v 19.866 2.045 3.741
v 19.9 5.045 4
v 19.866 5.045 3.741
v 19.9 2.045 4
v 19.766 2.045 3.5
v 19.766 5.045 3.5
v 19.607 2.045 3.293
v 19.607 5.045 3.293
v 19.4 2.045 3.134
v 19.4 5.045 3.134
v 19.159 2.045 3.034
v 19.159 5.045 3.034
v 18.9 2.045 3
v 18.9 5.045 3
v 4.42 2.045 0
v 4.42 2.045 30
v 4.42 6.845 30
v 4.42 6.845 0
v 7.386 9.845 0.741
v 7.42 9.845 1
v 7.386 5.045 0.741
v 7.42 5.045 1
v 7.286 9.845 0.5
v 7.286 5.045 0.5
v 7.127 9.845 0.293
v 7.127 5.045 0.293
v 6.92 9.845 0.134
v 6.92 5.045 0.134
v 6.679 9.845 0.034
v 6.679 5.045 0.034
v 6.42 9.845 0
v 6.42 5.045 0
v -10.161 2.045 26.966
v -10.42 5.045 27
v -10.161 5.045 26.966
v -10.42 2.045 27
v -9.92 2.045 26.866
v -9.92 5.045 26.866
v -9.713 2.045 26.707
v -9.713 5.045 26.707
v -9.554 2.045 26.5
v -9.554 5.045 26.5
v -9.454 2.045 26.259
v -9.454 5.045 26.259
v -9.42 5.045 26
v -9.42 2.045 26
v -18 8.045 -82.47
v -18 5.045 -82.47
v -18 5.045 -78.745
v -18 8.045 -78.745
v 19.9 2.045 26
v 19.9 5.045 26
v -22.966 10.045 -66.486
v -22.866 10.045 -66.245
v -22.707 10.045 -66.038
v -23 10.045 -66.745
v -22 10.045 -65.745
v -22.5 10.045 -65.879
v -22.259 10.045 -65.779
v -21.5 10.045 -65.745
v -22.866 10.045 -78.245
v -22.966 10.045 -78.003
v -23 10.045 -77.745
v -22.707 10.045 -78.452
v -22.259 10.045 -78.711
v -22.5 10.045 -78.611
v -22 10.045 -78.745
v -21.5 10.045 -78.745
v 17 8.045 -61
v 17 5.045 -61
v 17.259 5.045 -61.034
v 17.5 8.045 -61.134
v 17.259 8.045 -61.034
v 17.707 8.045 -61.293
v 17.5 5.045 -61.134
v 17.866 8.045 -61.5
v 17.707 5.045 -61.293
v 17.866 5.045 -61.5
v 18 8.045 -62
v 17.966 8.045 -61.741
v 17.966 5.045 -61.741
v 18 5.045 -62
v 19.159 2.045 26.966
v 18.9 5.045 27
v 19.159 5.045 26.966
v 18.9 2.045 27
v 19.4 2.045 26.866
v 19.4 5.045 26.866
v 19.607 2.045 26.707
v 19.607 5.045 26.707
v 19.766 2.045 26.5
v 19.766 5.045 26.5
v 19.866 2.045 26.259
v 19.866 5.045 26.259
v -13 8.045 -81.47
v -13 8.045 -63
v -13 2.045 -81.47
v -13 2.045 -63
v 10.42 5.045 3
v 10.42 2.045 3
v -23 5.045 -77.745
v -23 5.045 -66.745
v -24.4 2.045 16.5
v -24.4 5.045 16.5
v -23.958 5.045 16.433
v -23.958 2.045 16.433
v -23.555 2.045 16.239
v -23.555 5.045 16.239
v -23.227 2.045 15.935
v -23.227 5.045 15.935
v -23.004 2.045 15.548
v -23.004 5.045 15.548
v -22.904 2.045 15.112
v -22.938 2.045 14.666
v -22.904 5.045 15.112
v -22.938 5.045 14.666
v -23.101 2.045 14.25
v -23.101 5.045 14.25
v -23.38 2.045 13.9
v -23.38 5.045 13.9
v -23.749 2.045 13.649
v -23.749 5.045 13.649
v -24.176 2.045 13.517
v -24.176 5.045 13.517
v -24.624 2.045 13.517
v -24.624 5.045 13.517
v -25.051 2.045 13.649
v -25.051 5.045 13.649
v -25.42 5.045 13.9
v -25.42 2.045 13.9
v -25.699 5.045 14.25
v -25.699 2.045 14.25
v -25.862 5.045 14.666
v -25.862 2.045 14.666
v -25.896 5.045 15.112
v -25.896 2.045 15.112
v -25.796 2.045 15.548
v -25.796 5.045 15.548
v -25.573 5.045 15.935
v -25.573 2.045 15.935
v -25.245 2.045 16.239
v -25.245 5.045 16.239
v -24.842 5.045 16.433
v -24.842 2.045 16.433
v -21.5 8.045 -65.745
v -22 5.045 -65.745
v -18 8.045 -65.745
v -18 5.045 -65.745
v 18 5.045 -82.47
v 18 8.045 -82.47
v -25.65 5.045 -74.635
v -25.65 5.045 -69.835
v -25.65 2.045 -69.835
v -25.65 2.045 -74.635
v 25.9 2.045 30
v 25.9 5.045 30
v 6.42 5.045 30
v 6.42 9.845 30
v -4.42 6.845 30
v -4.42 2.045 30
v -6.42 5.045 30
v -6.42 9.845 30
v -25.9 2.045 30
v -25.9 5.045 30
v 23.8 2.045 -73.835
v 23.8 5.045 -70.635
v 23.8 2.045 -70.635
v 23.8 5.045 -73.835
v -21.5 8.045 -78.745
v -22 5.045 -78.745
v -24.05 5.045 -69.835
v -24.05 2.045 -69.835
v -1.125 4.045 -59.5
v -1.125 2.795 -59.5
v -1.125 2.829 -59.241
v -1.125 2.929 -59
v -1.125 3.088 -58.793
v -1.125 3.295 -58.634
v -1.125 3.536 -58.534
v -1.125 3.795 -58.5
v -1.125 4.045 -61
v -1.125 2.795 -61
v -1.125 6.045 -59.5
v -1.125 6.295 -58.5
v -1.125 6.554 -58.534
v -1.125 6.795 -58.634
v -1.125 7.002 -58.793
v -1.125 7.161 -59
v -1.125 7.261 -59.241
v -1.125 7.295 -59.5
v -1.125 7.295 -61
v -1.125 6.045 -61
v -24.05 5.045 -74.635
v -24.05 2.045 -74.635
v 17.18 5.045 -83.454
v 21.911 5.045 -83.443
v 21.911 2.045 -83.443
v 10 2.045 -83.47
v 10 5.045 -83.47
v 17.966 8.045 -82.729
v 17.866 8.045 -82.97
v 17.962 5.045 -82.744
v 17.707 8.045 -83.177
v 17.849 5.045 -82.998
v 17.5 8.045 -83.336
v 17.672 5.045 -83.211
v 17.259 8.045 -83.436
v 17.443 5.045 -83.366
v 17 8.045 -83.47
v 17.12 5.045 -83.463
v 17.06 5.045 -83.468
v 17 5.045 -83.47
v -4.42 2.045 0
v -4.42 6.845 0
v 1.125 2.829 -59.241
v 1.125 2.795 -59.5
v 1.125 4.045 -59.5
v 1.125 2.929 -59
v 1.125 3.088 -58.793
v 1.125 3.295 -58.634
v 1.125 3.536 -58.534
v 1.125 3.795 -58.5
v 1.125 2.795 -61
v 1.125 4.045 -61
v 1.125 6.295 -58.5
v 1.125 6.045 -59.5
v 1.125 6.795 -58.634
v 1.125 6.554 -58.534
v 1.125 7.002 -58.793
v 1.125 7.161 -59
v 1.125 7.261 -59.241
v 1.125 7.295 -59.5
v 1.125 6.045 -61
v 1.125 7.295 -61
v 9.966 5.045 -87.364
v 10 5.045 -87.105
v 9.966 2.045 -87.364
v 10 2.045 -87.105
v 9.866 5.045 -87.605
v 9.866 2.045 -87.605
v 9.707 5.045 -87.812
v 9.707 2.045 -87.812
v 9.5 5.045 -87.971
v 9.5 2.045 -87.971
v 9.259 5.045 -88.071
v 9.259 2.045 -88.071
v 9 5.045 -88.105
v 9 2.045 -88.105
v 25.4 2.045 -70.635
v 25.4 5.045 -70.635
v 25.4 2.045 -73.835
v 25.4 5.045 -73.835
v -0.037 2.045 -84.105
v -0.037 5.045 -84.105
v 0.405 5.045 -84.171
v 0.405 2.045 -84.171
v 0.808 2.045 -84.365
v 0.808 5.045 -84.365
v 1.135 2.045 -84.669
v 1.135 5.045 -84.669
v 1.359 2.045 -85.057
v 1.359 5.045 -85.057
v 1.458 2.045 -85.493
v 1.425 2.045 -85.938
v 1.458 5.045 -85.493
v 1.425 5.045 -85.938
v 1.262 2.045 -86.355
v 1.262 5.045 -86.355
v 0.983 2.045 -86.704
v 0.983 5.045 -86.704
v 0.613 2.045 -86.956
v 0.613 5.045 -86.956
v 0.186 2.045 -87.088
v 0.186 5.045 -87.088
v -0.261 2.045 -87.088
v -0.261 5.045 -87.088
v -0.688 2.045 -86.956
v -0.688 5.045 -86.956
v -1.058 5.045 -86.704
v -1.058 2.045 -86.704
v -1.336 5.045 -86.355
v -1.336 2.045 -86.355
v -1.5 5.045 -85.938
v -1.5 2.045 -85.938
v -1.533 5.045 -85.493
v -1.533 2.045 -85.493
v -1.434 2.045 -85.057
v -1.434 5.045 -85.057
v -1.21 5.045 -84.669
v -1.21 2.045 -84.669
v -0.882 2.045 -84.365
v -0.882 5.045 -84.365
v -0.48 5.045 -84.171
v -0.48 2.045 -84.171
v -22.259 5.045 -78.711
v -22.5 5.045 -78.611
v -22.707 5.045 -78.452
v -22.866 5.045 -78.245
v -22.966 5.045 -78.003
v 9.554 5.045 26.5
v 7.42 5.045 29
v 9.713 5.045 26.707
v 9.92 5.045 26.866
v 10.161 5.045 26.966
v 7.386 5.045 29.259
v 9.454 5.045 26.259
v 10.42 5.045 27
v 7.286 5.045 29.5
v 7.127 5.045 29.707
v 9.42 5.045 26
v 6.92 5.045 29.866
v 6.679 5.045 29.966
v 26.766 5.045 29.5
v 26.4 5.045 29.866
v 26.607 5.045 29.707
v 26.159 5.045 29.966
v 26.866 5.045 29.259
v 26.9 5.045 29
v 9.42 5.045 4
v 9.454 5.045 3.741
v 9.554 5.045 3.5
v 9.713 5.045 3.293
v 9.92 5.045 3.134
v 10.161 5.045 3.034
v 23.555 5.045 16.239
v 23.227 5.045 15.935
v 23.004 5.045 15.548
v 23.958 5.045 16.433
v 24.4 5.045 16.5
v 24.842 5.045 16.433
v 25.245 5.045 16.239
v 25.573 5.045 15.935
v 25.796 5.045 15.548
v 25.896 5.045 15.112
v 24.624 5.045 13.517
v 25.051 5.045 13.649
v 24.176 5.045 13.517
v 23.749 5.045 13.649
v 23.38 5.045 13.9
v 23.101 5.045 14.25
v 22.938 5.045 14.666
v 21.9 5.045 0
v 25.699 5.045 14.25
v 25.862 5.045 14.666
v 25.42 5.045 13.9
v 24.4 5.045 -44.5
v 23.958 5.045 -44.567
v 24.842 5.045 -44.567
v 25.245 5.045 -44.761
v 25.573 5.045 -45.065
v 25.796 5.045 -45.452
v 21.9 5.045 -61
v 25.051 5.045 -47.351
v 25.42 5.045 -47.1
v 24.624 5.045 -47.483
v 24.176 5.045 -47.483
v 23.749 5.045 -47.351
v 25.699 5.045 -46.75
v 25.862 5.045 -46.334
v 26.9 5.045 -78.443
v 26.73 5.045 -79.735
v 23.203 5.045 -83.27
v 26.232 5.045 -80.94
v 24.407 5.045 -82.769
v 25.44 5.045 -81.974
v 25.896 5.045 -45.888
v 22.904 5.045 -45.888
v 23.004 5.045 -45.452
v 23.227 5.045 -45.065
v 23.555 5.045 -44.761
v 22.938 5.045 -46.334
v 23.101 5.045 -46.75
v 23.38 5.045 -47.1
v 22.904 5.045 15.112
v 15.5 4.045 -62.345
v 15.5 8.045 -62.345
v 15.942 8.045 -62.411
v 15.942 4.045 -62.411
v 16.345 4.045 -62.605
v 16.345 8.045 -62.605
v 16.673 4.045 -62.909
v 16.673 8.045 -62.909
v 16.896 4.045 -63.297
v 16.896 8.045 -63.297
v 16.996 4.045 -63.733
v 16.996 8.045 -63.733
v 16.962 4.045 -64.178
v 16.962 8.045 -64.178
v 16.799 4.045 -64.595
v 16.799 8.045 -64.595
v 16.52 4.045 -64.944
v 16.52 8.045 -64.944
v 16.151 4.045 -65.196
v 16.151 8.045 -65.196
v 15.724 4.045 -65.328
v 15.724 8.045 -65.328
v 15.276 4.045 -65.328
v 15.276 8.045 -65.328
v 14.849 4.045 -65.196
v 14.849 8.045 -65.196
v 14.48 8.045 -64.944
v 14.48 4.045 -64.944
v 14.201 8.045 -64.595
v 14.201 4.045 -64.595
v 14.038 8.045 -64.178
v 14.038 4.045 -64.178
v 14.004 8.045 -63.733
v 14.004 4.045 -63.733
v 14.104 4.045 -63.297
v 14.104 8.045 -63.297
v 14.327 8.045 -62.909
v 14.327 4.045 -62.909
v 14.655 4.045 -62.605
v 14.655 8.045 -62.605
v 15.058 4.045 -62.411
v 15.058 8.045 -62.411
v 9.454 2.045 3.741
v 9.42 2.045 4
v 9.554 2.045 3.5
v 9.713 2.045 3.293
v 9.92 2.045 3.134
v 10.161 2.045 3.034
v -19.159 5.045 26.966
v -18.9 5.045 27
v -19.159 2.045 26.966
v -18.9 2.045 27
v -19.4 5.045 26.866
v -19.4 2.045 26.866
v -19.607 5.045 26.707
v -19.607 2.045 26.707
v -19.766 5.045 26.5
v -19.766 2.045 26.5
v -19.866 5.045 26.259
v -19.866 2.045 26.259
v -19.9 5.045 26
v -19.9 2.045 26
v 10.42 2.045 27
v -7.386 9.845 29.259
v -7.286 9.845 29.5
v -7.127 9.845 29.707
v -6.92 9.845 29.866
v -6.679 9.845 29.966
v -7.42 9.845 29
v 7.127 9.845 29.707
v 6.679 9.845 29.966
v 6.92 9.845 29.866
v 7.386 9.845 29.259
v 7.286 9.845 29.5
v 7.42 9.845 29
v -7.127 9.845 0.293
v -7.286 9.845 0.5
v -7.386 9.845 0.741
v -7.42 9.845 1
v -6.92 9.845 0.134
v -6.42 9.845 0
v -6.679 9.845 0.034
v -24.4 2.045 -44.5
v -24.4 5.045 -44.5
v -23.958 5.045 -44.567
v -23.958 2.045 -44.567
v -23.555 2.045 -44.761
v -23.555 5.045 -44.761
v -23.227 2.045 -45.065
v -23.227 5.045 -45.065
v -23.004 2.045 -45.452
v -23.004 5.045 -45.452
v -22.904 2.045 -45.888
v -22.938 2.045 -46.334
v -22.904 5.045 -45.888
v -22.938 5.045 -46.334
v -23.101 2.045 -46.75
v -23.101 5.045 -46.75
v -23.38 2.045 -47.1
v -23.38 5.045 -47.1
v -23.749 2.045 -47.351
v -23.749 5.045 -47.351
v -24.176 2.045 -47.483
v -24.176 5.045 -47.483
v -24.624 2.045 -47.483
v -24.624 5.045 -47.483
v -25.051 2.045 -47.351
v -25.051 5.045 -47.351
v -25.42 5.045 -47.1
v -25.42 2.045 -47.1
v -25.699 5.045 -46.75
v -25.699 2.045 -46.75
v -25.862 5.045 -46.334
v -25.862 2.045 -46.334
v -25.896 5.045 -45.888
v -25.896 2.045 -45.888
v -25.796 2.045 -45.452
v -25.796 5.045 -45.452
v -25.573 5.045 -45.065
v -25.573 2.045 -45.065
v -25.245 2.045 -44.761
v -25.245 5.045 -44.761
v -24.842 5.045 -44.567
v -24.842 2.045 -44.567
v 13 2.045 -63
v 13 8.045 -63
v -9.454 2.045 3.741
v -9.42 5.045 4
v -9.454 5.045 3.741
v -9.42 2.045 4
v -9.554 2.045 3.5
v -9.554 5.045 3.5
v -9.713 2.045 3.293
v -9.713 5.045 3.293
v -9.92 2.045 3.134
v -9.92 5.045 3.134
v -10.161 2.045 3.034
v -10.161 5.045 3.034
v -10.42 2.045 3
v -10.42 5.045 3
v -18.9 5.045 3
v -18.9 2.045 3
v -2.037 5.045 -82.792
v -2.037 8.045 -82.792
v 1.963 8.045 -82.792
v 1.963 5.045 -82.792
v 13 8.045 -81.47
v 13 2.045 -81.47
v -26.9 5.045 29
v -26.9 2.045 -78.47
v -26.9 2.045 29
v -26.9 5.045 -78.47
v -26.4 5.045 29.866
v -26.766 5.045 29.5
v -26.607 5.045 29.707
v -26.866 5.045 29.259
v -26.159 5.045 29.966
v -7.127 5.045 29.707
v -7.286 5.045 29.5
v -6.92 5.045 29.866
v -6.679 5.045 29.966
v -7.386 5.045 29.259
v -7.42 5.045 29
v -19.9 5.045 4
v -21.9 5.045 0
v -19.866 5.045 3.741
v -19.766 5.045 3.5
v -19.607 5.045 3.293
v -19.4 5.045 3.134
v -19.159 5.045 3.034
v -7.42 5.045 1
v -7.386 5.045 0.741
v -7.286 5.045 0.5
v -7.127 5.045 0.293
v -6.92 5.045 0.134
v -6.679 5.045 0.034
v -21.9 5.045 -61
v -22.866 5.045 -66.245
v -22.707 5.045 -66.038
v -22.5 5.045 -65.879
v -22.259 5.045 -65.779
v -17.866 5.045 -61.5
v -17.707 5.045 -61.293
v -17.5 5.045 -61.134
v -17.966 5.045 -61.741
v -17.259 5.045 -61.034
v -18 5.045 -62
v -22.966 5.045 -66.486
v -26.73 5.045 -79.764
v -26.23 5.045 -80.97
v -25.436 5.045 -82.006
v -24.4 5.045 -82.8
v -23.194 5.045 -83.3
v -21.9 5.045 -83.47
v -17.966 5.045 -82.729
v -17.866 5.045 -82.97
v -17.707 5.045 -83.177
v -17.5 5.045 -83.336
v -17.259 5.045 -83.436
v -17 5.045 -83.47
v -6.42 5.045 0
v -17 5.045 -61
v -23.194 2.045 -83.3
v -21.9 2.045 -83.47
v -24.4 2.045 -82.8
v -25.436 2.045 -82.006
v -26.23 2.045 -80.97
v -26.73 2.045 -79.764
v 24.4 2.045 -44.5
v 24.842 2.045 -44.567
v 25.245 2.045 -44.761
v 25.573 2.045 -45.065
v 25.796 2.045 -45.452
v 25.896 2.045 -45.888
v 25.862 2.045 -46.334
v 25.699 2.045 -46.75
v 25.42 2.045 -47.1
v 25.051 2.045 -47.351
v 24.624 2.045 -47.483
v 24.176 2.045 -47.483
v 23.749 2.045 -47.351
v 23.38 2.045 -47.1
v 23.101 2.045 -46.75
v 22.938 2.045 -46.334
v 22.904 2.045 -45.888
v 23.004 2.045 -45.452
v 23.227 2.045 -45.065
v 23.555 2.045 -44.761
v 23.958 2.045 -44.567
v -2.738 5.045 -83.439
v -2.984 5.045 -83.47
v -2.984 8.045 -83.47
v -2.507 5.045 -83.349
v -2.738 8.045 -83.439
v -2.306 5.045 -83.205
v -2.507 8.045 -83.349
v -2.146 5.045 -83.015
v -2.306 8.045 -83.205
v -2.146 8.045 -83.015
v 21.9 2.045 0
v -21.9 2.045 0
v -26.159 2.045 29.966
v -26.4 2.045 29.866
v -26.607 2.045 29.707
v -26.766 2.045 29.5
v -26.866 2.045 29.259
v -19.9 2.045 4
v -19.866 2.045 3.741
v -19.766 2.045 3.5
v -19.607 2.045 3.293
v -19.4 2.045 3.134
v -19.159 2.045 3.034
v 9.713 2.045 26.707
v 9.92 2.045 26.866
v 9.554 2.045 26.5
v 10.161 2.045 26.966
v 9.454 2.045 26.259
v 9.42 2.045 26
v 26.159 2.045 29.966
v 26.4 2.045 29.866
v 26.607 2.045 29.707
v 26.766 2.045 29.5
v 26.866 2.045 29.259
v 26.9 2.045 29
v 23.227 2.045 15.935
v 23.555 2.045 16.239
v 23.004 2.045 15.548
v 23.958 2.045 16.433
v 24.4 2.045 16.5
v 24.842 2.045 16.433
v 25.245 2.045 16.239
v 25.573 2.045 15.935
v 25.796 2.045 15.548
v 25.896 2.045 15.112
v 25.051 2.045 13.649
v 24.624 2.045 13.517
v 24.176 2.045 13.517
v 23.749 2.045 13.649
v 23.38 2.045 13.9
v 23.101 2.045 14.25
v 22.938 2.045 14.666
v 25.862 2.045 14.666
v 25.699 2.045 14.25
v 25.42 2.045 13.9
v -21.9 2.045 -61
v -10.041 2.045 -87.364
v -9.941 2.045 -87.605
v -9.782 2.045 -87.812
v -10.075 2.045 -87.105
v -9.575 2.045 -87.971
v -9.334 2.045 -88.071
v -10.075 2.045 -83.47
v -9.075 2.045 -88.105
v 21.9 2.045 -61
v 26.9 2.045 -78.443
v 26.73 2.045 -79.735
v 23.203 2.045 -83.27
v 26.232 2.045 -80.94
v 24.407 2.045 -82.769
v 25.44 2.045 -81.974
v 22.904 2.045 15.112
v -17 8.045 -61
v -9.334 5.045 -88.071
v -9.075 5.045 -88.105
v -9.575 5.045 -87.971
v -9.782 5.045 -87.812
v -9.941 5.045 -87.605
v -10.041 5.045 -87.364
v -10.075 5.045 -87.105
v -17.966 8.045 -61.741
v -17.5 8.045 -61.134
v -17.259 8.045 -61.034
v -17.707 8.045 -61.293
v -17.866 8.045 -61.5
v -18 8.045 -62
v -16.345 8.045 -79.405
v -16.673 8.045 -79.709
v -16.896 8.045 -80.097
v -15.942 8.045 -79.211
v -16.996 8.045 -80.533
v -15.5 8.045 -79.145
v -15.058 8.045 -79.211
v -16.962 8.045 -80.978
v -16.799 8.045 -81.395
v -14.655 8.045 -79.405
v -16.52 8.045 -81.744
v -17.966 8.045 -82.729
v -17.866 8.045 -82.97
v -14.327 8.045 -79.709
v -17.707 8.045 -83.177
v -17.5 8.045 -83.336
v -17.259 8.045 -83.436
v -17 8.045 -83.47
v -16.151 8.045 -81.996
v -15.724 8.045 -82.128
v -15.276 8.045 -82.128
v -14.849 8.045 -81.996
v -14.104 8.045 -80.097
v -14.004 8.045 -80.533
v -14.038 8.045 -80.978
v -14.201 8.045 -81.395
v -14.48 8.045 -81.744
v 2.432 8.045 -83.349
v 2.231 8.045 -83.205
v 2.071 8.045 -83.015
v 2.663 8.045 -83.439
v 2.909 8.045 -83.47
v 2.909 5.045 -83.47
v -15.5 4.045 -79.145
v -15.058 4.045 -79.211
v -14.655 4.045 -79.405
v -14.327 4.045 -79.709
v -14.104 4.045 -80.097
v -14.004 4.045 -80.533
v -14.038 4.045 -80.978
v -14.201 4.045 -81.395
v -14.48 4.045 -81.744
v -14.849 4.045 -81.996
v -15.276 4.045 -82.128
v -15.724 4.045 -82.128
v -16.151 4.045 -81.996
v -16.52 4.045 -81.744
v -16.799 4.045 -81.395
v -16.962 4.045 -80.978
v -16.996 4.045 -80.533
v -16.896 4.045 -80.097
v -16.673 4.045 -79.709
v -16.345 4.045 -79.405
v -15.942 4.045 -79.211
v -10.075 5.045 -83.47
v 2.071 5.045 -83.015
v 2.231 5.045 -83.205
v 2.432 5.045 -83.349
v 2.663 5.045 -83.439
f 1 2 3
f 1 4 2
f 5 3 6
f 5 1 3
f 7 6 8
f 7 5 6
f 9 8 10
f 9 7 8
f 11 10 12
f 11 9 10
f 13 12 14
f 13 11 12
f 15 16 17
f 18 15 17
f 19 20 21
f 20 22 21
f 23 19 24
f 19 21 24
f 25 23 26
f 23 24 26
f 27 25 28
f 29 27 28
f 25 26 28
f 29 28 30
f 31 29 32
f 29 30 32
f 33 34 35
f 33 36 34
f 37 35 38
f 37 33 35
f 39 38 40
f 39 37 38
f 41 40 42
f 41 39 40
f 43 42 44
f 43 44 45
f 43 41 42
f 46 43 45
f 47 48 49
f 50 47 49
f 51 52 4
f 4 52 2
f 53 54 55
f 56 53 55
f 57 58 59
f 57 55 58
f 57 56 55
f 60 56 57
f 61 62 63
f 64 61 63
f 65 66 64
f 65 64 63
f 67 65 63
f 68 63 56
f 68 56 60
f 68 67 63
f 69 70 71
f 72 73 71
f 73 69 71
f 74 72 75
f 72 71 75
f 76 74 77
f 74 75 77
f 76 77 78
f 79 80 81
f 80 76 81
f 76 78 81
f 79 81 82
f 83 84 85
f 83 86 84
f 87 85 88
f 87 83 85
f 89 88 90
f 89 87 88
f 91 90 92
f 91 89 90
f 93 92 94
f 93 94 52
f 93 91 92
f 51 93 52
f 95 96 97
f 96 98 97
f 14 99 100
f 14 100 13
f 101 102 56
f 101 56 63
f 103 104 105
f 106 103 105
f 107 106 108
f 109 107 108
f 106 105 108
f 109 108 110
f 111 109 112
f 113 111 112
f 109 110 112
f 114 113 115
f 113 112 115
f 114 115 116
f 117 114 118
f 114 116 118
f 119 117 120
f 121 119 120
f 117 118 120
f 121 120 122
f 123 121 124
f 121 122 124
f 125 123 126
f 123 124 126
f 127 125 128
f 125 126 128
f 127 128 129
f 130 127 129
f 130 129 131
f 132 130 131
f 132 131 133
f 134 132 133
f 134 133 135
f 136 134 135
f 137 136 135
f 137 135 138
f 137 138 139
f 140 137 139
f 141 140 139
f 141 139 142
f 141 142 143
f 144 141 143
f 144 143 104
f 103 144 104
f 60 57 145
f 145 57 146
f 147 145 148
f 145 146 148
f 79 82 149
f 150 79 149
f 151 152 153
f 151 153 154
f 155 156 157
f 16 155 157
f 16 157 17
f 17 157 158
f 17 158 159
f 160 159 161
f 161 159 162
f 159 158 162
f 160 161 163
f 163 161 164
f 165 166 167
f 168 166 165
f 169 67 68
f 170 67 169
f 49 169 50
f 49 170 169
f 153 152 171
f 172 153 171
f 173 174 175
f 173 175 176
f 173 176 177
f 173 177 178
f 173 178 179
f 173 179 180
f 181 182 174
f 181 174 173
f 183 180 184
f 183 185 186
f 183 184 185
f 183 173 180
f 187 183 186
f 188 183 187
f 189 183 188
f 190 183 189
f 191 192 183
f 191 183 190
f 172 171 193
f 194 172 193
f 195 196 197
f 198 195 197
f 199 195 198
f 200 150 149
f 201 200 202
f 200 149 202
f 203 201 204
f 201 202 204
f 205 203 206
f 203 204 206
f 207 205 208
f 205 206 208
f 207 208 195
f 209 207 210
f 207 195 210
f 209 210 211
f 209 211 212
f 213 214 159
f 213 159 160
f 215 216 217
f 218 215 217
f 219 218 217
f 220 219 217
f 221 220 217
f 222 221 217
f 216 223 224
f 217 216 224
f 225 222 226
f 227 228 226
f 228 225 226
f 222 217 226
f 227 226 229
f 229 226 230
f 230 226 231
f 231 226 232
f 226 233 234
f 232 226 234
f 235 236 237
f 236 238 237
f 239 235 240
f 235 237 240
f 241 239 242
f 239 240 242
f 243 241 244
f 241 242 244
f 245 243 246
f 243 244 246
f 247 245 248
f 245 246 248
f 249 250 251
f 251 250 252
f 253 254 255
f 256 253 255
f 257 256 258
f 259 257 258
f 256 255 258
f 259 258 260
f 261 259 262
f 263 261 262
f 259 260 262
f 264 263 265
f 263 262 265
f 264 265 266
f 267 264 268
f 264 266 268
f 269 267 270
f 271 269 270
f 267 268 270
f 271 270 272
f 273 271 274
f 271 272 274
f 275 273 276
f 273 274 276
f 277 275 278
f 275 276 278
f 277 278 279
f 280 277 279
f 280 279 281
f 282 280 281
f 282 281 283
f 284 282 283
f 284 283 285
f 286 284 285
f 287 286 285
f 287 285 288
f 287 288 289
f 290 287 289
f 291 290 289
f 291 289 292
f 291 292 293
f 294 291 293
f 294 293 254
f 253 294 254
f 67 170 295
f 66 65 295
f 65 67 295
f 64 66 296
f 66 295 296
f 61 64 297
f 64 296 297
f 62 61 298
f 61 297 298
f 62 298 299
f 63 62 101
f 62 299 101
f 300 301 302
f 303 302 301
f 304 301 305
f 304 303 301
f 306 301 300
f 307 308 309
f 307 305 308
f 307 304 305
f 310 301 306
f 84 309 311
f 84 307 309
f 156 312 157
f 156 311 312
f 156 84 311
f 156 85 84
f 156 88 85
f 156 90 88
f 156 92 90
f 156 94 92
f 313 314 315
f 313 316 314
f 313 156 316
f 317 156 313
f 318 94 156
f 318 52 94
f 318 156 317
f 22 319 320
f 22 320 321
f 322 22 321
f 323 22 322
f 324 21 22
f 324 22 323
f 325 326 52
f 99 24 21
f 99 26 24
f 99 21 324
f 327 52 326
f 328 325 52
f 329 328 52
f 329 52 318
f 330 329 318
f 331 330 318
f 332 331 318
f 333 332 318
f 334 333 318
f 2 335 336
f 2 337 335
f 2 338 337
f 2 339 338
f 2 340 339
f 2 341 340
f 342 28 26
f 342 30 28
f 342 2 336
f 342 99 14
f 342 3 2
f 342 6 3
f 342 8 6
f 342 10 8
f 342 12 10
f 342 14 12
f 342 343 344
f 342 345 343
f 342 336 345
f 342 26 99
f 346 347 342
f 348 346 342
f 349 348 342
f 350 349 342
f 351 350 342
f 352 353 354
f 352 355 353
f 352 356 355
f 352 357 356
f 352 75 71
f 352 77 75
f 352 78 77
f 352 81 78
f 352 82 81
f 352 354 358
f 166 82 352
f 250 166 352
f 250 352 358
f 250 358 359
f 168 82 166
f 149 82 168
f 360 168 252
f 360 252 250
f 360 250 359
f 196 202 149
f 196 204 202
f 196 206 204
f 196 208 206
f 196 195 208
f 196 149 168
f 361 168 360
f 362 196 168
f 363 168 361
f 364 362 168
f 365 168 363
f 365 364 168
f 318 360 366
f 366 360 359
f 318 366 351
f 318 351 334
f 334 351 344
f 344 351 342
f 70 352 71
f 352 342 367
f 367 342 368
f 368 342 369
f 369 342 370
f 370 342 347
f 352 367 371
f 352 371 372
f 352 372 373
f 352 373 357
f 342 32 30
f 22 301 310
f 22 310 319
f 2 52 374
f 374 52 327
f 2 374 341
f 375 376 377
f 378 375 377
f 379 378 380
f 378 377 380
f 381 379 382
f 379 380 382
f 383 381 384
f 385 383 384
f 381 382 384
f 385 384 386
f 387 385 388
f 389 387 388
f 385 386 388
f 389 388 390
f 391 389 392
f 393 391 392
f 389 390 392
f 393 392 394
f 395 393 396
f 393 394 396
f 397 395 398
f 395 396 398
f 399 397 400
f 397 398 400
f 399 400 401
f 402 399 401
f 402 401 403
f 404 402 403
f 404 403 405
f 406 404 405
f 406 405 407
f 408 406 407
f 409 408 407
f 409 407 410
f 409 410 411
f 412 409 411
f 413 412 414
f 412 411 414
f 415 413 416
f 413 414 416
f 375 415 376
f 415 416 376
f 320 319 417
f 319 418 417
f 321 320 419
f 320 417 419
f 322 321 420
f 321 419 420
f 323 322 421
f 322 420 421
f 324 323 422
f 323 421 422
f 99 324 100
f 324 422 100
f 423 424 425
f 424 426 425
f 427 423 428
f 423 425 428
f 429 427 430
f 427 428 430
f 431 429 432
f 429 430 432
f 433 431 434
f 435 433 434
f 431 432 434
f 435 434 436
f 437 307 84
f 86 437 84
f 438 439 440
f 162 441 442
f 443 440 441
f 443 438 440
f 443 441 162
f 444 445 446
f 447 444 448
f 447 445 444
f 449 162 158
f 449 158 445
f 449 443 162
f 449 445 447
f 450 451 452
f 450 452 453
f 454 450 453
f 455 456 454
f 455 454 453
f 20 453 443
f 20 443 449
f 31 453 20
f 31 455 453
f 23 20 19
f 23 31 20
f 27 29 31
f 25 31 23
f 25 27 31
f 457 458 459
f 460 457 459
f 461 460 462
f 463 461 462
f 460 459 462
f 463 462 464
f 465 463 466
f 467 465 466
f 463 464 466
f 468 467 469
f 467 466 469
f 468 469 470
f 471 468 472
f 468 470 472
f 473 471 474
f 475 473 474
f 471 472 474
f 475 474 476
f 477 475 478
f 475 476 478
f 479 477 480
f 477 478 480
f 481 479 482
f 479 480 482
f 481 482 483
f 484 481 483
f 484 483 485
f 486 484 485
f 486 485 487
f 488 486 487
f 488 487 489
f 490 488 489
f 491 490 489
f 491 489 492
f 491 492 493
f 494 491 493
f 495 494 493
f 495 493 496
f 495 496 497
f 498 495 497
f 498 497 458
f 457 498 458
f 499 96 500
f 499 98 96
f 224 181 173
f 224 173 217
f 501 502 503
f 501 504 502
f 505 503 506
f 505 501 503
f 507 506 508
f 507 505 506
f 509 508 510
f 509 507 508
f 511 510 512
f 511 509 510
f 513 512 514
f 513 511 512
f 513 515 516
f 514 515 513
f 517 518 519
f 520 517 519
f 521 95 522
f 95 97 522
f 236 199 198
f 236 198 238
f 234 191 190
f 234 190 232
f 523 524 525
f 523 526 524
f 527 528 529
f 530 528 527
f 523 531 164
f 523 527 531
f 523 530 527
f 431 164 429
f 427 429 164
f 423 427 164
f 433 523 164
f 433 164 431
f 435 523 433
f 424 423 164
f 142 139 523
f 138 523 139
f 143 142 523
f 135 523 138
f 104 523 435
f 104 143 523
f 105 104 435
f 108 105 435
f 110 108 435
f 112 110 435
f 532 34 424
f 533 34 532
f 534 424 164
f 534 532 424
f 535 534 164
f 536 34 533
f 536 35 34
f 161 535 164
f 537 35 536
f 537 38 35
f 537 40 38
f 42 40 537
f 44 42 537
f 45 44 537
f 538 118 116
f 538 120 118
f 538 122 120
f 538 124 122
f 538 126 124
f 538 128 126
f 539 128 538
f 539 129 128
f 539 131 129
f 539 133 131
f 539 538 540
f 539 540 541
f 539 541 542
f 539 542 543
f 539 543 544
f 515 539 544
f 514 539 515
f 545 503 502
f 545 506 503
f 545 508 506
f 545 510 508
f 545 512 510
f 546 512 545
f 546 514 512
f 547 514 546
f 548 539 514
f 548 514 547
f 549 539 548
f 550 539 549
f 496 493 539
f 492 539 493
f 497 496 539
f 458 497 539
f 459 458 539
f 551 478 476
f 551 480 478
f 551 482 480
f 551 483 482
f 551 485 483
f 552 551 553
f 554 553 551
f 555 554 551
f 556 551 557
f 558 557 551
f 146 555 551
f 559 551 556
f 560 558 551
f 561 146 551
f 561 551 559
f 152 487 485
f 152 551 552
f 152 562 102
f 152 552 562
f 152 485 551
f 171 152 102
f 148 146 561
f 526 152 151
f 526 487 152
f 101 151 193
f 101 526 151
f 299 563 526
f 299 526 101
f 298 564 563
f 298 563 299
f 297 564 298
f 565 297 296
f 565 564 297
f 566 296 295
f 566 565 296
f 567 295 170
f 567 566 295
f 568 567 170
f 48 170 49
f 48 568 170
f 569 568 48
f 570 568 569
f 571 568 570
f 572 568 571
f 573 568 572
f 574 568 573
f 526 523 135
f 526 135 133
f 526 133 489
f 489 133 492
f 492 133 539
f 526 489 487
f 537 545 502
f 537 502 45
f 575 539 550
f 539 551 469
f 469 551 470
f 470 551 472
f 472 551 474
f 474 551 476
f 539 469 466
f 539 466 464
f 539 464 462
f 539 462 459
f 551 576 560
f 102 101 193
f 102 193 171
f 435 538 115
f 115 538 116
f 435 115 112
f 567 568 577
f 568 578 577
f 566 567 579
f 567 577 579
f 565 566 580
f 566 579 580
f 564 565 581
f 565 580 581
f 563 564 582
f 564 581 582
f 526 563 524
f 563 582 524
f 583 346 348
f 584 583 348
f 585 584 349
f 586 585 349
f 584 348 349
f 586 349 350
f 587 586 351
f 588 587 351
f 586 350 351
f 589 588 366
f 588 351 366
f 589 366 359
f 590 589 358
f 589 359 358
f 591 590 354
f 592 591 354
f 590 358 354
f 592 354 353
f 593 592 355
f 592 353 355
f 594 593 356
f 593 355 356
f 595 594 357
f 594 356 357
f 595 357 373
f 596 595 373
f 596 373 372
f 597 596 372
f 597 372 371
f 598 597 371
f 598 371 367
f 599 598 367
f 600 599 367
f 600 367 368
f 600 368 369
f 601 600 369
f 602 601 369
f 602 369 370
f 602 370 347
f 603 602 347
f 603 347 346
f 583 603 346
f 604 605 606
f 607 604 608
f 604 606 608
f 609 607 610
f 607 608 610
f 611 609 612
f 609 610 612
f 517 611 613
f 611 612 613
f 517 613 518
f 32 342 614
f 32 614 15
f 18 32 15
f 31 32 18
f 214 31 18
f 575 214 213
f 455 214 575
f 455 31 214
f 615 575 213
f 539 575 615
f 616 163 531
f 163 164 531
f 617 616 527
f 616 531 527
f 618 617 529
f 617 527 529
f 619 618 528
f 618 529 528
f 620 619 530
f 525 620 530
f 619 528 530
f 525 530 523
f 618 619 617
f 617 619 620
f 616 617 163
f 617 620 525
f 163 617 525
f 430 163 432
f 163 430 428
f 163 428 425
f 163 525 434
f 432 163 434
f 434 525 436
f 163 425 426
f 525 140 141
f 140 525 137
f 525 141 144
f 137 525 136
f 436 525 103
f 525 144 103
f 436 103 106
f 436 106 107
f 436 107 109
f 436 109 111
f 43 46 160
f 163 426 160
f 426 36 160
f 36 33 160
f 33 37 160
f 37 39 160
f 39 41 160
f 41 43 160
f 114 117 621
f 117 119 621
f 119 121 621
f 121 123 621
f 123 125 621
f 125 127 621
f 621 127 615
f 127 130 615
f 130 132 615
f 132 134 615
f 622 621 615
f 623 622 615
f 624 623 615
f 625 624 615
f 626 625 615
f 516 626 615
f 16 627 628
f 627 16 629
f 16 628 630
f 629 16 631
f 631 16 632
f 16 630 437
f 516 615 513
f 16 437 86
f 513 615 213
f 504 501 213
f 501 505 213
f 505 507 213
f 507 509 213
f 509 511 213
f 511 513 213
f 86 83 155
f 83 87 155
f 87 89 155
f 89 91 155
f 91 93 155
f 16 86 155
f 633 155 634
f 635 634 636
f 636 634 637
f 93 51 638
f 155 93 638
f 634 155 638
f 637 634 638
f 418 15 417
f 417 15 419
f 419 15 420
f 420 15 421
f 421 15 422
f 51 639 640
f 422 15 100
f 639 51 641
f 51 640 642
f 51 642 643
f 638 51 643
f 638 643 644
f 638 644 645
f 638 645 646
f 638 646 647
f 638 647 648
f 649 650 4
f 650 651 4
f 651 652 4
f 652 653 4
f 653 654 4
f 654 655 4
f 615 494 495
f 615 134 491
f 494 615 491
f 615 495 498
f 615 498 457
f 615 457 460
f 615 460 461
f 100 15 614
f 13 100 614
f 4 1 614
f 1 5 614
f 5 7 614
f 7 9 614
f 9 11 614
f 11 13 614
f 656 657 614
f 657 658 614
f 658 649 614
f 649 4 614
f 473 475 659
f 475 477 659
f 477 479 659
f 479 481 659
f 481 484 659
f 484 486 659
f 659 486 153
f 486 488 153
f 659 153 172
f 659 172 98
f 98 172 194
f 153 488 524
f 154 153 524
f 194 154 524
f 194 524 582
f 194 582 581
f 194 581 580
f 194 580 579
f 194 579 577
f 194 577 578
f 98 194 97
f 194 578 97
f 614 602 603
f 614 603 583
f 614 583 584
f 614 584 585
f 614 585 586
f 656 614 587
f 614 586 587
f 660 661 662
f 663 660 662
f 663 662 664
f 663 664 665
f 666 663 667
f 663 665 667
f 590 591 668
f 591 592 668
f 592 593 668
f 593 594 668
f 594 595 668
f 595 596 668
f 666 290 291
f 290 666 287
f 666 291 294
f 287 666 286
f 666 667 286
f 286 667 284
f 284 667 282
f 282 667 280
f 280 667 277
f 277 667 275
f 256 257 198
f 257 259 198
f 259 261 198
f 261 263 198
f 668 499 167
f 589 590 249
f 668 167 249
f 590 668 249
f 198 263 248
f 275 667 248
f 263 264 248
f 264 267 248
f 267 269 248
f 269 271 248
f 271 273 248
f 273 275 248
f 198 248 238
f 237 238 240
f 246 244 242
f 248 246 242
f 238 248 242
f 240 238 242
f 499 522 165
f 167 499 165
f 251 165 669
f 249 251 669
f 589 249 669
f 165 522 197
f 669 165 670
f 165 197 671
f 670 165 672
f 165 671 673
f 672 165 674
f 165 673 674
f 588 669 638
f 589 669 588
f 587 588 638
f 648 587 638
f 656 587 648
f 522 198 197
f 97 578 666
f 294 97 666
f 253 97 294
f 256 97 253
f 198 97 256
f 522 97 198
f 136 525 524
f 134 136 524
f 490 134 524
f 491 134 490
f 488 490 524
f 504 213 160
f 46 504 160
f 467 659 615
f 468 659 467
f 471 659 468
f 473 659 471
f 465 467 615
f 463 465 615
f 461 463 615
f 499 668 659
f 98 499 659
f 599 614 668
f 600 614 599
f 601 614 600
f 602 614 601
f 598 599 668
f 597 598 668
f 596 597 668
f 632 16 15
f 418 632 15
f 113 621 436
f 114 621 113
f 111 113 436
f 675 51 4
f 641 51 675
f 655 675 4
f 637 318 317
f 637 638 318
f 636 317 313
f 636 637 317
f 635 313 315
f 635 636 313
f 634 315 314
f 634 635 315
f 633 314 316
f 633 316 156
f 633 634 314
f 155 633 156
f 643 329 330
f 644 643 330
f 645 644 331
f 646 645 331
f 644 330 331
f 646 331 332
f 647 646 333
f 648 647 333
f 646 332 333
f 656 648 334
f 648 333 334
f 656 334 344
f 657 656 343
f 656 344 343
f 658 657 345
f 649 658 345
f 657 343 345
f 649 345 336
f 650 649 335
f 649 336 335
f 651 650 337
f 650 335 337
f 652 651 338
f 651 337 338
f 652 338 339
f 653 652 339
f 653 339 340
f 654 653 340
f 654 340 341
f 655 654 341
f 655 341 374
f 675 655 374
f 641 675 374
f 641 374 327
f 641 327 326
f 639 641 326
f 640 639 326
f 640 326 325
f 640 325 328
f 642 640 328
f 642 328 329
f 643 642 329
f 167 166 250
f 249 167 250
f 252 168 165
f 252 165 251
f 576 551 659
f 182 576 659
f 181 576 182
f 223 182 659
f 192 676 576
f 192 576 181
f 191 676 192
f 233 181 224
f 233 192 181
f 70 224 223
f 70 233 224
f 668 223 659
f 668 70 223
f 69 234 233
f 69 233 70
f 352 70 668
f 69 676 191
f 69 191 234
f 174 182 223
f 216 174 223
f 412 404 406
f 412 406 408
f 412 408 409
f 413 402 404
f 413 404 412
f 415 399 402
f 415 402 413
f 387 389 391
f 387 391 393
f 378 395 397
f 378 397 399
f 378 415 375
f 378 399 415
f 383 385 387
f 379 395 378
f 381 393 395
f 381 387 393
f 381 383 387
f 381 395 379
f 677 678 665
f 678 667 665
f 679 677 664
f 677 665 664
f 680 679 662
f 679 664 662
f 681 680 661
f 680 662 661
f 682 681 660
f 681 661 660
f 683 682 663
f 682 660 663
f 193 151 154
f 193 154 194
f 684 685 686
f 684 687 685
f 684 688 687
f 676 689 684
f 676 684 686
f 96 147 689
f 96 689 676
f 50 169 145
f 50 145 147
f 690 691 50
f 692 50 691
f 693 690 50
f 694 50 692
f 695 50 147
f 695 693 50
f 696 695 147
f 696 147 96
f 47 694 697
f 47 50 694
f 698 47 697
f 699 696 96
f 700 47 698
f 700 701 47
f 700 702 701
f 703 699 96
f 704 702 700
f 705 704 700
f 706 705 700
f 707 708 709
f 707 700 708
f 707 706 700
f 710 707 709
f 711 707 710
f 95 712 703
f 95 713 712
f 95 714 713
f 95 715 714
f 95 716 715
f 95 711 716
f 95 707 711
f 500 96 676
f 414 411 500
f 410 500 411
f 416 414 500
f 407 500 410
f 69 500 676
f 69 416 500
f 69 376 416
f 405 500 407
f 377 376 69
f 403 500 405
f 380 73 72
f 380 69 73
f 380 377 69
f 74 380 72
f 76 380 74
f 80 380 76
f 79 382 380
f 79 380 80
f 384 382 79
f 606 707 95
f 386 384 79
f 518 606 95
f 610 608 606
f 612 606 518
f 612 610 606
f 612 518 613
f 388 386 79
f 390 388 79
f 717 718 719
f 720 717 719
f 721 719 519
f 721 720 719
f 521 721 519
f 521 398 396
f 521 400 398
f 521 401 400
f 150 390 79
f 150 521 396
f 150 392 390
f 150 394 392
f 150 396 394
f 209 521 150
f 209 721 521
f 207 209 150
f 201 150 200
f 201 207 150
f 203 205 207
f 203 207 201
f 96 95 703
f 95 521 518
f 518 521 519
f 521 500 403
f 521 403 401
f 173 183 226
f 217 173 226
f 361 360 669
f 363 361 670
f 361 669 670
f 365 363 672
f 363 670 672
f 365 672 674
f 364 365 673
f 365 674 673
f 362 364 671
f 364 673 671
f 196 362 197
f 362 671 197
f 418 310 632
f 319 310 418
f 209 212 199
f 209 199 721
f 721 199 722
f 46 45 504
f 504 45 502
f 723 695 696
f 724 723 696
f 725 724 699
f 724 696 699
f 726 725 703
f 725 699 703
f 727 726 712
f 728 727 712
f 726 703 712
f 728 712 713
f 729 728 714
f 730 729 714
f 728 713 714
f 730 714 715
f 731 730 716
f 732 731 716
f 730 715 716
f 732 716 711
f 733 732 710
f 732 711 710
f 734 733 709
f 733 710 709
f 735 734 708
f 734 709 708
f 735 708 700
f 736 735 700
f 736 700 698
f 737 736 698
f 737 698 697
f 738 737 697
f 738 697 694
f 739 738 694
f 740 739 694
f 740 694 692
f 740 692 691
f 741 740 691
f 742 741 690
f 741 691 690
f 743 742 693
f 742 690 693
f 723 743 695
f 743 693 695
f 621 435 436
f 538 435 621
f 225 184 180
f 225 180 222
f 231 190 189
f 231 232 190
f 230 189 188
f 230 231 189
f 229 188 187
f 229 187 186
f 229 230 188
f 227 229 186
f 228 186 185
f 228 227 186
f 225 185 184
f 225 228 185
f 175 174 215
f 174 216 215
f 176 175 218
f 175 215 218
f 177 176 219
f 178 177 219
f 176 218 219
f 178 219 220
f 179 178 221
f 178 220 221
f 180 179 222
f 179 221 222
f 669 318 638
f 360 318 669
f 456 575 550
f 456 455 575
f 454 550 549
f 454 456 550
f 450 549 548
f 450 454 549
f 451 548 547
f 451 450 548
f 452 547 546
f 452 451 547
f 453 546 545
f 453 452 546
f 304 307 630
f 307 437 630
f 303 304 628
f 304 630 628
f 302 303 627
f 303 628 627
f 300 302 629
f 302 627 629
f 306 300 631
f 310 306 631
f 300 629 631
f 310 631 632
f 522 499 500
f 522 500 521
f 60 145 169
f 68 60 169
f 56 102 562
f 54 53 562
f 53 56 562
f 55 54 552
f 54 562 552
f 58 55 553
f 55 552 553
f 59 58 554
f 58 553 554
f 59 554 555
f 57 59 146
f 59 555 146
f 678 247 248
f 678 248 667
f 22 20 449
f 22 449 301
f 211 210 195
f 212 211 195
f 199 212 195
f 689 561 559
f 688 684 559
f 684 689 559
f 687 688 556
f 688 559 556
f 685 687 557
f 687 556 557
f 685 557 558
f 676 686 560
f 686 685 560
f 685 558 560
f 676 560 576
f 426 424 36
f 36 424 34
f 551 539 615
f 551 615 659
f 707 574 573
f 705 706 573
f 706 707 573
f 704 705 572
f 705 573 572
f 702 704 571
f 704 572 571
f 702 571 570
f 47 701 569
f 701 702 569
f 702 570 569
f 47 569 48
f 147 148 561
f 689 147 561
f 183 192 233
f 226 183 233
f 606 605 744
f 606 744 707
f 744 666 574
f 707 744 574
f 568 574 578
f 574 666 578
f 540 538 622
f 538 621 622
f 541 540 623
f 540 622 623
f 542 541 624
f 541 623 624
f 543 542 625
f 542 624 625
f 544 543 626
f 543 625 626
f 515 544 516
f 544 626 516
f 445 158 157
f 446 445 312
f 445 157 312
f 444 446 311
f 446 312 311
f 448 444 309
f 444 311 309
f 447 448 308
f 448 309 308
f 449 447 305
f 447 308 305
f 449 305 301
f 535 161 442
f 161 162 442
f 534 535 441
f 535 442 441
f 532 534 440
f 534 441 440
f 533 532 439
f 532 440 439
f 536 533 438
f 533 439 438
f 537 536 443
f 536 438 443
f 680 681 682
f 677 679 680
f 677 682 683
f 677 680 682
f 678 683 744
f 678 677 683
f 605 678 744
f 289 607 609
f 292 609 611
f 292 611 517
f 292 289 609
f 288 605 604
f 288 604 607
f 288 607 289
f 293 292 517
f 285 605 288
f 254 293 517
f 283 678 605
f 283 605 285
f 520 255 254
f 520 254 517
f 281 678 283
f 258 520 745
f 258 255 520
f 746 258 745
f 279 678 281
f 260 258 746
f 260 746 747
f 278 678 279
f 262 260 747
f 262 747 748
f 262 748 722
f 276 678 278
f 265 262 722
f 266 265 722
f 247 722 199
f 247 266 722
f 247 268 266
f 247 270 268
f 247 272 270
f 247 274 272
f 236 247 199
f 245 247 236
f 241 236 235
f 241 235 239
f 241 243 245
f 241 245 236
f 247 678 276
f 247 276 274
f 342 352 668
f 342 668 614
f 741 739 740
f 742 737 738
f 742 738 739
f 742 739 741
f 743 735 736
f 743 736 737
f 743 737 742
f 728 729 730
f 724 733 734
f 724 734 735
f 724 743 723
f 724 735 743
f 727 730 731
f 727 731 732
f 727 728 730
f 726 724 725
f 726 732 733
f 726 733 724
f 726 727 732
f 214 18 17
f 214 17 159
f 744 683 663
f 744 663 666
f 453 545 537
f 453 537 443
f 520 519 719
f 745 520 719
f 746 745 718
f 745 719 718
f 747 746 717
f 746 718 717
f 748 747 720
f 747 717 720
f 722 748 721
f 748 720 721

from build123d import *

# Parameters (mm, degrees)
BOSS_EXTRUDE1_DEPTH = 30
BOSS_EXTRUDE2_DEPTH = 3
SKETCH4_W           = 10.48
SKETCH4_H           = 24
CUT_EXTRUDE1_DEPTH  = 93.244717637
SKETCH5_R           = 1.5
CUT_EXTRUDE2_DEPTH  = 93.244717637
FILLET1_R           = 1
SKETCH7_W           = 26
SKETCH7_H           = 18.47
BOSS_EXTRUDE3_DEPTH = 3
SKETCH8_R           = 1.5
CUT_EXTRUDE3_DEPTH  = 4
SKETCH9_W           = 1.5
SKETCH9_H           = 13
BOSS_EXTRUDE4_DEPTH = 2
SKETCH10_W          = 26
SKETCH10_H          = 18.47
CUT_EXTRUDE4_DEPTH  = 3
SKETCH11_W          = 4
SKETCH11_H          = 0.67806633
CUT_EXTRUDE5_DEPTH  = 3
FILLET2_R           = 1
FILLET3_R           = 5
SKETCH12_W          = 1.6
SKETCH12_H          = 3.2
SKETCH12_H_2        = 4.8
CUT_EXTRUDE6_DEPTH  = 3
SKETCH13_W          = 2.25
SKETCH13_H          = 1.25
BOSS_EXTRUDE5_DEPTH = 1.5
SKETCH14_W          = 2.25
SKETCH14_H          = 4.5
BOSS_EXTRUDE6_DEPTH = 1
FILLET4_R           = 1


with BuildPart() as part:
    # Sketch1 → Boss-Extrude1 (new body)
    with BuildSketch(Plane.XY):
        Polygon((-26.9, 2.045135231), (-26.9, 5.045135231), (-7.42, 5.045135231), (-7.42, 9.845135231), (7.42, 9.845135231), (7.42, 5.045135231), (26.9, 5.045135231), (26.9, 2.045135231), (4.42, 2.045135231), (4.42, 6.845135231), (-4.42, 6.845135231), (-4.42, 2.045135231), align=None)
    extrude(amount=BOSS_EXTRUDE1_DEPTH)

    # Sketch3 → Boss-Extrude2 (add)
    with BuildSketch(Plane(origin=(0, 5.045135231, 0), x_dir=(1, 0, 0), z_dir=(0, 1, 0))):
        Polygon((26.9, 0), (26.9, 83.431524331), (10, 83.47), (10, 88.104698694), (-10.074836098, 88.104698694), (-10.074836098, 83.47), (-26.9, 83.47), (-26.9, 0), (-21.9, 0), (-21.9, 61), (21.9, 61), (21.9, 0), align=None)
    extrude(amount=-BOSS_EXTRUDE2_DEPTH)

    # Sketch4 → Cut-Extrude1 (cut, through all)
    with BuildSketch(Plane(origin=(0, 5.045135231, 0), x_dir=(1, 0, 0), z_dir=(0, 1, 0))):
        with Locations((14.66, -15)):
            Rectangle(SKETCH4_W, SKETCH4_H)
        with Locations((-14.66, -15)):
            Rectangle(SKETCH4_W, SKETCH4_H)
    extrude(amount=-CUT_EXTRUDE1_DEPTH, mode=Mode.SUBTRACT)

    # Sketch5 → Cut-Extrude2 (cut, through all)
    with BuildSketch(Plane(origin=(0, 5.045135231, 0), x_dir=(1, 0, 0), z_dir=(0, 1, 0))):
        with Locations(Location((24.4, -15, 0), (0, 0, 270))):
            Circle(SKETCH5_R)
        with Locations(Location((-24.4, -15, 0), (0, 0, 270))):
            Circle(SKETCH5_R)
        with Locations(Location((-0.037418049, 85.604698694, 0), (0, 0, 270))):
            Circle(SKETCH5_R)
        with Locations(Location((24.4, 46, 0), (0, 0, 270))):
            Circle(SKETCH5_R)
        with Locations(Location((-24.4, 46, 0), (0, 0, 270))):
            Circle(SKETCH5_R)
    extrude(amount=-CUT_EXTRUDE2_DEPTH, mode=Mode.SUBTRACT)

    # Fillet1
    fillet1_edges = [part.edges().sort_by_distance(p)[0] for p in [
        (-7.42, 7.445135231, 0),
        (7.42, 7.445135231, 0),
        (26.9, 3.545135231, 30),
        (7.42, 7.445135231, 30),
        (-10.074836098, 3.545135231, -88.104698694),
        (10, 3.545135231, -88.104698694),
        (-7.42, 7.445135231, 30),
        (-26.9, 3.545135231, 30),
        (9.42, 3.545135231, 27),
        (9.42, 3.545135231, 3),
        (19.9, 3.545135231, 3),
        (19.9, 3.545135231, 27),
        (-19.9, 3.545135231, 3),
        (-9.42, 3.545135231, 3),
        (-9.42, 3.545135231, 27),
        (-19.9, 3.545135231, 27),
    ]]
    fillet(fillet1_edges, radius=FILLET1_R)

    # Sketch7 → Boss-Extrude3 (add)
    with BuildSketch(Plane(origin=(0, 5.045135231, 0), x_dir=(1, 0, 0), z_dir=(0, 1, 0))):
        Polygon((-18, 83.47), (-18, 78.74462915), (-23, 78.74462915), (-23, 65.74462915), (-18, 65.74462915), (-18, 61), (18, 61), (18, 83.47), align=None)
        with Locations((0, 72.235)):
            Rectangle(SKETCH7_W, SKETCH7_H, mode=Mode.SUBTRACT)
    extrude(amount=BOSS_EXTRUDE3_DEPTH)

    # Sketch8 → Cut-Extrude3 (cut)
    with BuildSketch(Plane(origin=(0, 8.045135231, 0), x_dir=(1, 0, 0), z_dir=(0, 1, 0))):
        with Locations(Location((-15.5, 80.64462915, 0), (0, 0, 270))):
            Circle(SKETCH8_R)
        with Locations(Location((15.5, 63.84462915, 0), (0, 0, 270))):
            Circle(SKETCH8_R)
    extrude(amount=-CUT_EXTRUDE3_DEPTH, mode=Mode.SUBTRACT)

    # Sketch9 → Boss-Extrude4 (add)
    with BuildSketch(Plane(origin=(0, 8.045135231, 0), x_dir=(1, 0, 0), z_dir=(0, 1, 0))):
        with Locations((-22.25, 72.24462915)):
            Rectangle(SKETCH9_W, SKETCH9_H)
    extrude(amount=BOSS_EXTRUDE4_DEPTH)

    # Sketch10 → Cut-Extrude4 (cut)
    with BuildSketch(Plane(origin=(0, 5.045135231, 0), x_dir=(1, 0, 0), z_dir=(0, 1, 0))):
        with Locations((0, 72.235)):
            Rectangle(SKETCH10_W, SKETCH10_H)
    extrude(amount=-CUT_EXTRUDE4_DEPTH, mode=Mode.SUBTRACT)

    # Sketch11 → Cut-Extrude5 (cut)
    with BuildSketch(Plane(origin=(0, 8.045135231, 0), x_dir=(1, 0, 0), z_dir=(0, 1, 0))):
        with Locations((-0.037418049, 83.130966835)):
            Rectangle(SKETCH11_W, SKETCH11_H)
    extrude(amount=-CUT_EXTRUDE5_DEPTH, mode=Mode.SUBTRACT)

    # Fillet2
    # the kernel refuses this fillet: 1 mm, written as the material it takes off along each edge
    with BuildSketch(Plane(origin=(18, 5.045135231, -83.47), x_dir=(0, 0, 1), z_dir=(0, 1, 0)), Plane(origin=(-18, 5.045135231, -83.47), x_dir=(1, 0, 0), z_dir=(0, 1, 0)), Plane(origin=(-18, 5.045135231, -61), x_dir=(0, 0, -1), z_dir=(0, 1, 0)), Plane(origin=(18, 5.045135231, -61), x_dir=(-1, 0, 0), z_dir=(0, 1, 0))) as fillet2_piece_1:
        with BuildLine():
            CenterArc((FILLET2_R, -FILLET2_R), FILLET2_R, 90, 90)
            Line((0, -FILLET2_R), (-FILLET2_R * 0.02, -FILLET2_R))
            Line((-FILLET2_R * 0.02, -FILLET2_R), (-FILLET2_R * 0.02, FILLET2_R * 0.02))
            Line((-FILLET2_R * 0.02, FILLET2_R * 0.02), (FILLET2_R, FILLET2_R * 0.02))
            Line((FILLET2_R, FILLET2_R * 0.02), (FILLET2_R, 0))
        make_face()
    extrude(amount=5.5, mode=Mode.SUBTRACT)
    with BuildSketch(Plane(origin=(-23, 5.045135231, -78.74462915), x_dir=(1, 0, 0), z_dir=(0, 1, 0)), Plane(origin=(-23, 5.045135231, -65.74462915), x_dir=(0, 0, -1), z_dir=(0, 1, 0))) as fillet2_piece_2:
        with BuildLine():
            CenterArc((FILLET2_R, -FILLET2_R), FILLET2_R, 90, 90)
            Line((0, -FILLET2_R), (-FILLET2_R * 0.02, -FILLET2_R))
            Line((-FILLET2_R * 0.02, -FILLET2_R), (-FILLET2_R * 0.02, FILLET2_R * 0.02))
            Line((-FILLET2_R * 0.02, FILLET2_R * 0.02), (FILLET2_R, FILLET2_R * 0.02))
            Line((FILLET2_R, FILLET2_R * 0.02), (FILLET2_R, 0))
        make_face()
    extrude(amount=7.5, mode=Mode.SUBTRACT)
    with BuildSketch(Plane(origin=(1.962581951, 10.412040795, -83.47), x_dir=(1, 0, 0), z_dir=(0, -1, 0))) as fillet2_piece_3:
        with BuildLine():
            CenterArc((0.946762226, 1), FILLET2_R, 198.779905416, 71.220094584)
            Line((0, 0.67806633), (-0.018935245, 0.671627657))
            ThreePointArc((-0.018935245, 0.671627657), (-0.02, 0.339033165), (-0.02, 0))
            Line((-0.02, 0), (0, -0.02))
            Line((0, -0.02), (0.946762226, -0.02))
            Line((0.946762226, -0.02), (0.946762226, 0))
        make_face()
    extrude(amount=5.366905565, mode=Mode.SUBTRACT)
    with BuildSketch(Plane(origin=(-2.037418049, 10.412040795, -83.47), x_dir=(-1, 0, 0), z_dir=(0, -1, 0))) as fillet2_piece_4:
        with BuildLine():
            CenterArc((0.946762226, -1), FILLET2_R, 90, 71.220094584)
            Line((0, -0.67806633), (-0.018935245, -0.671627657))
            ThreePointArc((-0.018935245, -0.671627657), (-0.02, -0.339033165), (-0.02, 0))
            Line((-0.02, 0), (0, 0.02))
            Line((0, 0.02), (0.946762226, 0.02))
            Line((0.946762226, 0.02), (0.946762226, 0))
        make_face()
    extrude(amount=5.366905565, mode=Mode.SUBTRACT)

    # Fillet3
    fillet3_edges = [part.edges().sort_by_distance(p)[0] for p in [
        (-26.9, 3.545135231, -83.47),
        (26.9, 3.545135231, -83.431524331),
    ]]
    fillet(fillet3_edges, radius=FILLET3_R)

    # Sketch12 → Cut-Extrude6 (cut)
    with BuildSketch(Plane(origin=(0, 5.045135231, 0), x_dir=(1, 0, 0), z_dir=(0, 1, 0))):
        with Locations((24.6, 72.235)):
            Rectangle(SKETCH12_W, SKETCH12_H)
        with Locations((-24.85, 72.235)):
            Rectangle(SKETCH12_W, SKETCH12_H_2)
    extrude(amount=-CUT_EXTRUDE6_DEPTH, mode=Mode.SUBTRACT)

    # Sketch13 → Boss-Extrude5 (add)
    with BuildSketch(Plane.XY.offset(-61)):
        with Locations((0, 6.670135231)):
            Rectangle(SKETCH13_W, SKETCH13_H)
        with Locations((0, 3.420135231)):
            Rectangle(SKETCH13_W, SKETCH13_H)
    extrude(amount=BOSS_EXTRUDE5_DEPTH)

    # Sketch14 → Boss-Extrude6 (add)
    with BuildSketch(Plane.XY.offset(-59.5)):
        with Locations((0, 5.045135231)):
            Rectangle(SKETCH14_W, SKETCH14_H)
    extrude(amount=BOSS_EXTRUDE6_DEPTH)

    # Fillet4
    fillet4_edges = [part.edges().sort_by_distance(p)[0] for p in [
        (0, 2.795135231, -58.5),
        (0, 7.295135231, -58.5),
    ]]
    fillet(fillet4_edges, radius=FILLET4_R)


solid = part.part
